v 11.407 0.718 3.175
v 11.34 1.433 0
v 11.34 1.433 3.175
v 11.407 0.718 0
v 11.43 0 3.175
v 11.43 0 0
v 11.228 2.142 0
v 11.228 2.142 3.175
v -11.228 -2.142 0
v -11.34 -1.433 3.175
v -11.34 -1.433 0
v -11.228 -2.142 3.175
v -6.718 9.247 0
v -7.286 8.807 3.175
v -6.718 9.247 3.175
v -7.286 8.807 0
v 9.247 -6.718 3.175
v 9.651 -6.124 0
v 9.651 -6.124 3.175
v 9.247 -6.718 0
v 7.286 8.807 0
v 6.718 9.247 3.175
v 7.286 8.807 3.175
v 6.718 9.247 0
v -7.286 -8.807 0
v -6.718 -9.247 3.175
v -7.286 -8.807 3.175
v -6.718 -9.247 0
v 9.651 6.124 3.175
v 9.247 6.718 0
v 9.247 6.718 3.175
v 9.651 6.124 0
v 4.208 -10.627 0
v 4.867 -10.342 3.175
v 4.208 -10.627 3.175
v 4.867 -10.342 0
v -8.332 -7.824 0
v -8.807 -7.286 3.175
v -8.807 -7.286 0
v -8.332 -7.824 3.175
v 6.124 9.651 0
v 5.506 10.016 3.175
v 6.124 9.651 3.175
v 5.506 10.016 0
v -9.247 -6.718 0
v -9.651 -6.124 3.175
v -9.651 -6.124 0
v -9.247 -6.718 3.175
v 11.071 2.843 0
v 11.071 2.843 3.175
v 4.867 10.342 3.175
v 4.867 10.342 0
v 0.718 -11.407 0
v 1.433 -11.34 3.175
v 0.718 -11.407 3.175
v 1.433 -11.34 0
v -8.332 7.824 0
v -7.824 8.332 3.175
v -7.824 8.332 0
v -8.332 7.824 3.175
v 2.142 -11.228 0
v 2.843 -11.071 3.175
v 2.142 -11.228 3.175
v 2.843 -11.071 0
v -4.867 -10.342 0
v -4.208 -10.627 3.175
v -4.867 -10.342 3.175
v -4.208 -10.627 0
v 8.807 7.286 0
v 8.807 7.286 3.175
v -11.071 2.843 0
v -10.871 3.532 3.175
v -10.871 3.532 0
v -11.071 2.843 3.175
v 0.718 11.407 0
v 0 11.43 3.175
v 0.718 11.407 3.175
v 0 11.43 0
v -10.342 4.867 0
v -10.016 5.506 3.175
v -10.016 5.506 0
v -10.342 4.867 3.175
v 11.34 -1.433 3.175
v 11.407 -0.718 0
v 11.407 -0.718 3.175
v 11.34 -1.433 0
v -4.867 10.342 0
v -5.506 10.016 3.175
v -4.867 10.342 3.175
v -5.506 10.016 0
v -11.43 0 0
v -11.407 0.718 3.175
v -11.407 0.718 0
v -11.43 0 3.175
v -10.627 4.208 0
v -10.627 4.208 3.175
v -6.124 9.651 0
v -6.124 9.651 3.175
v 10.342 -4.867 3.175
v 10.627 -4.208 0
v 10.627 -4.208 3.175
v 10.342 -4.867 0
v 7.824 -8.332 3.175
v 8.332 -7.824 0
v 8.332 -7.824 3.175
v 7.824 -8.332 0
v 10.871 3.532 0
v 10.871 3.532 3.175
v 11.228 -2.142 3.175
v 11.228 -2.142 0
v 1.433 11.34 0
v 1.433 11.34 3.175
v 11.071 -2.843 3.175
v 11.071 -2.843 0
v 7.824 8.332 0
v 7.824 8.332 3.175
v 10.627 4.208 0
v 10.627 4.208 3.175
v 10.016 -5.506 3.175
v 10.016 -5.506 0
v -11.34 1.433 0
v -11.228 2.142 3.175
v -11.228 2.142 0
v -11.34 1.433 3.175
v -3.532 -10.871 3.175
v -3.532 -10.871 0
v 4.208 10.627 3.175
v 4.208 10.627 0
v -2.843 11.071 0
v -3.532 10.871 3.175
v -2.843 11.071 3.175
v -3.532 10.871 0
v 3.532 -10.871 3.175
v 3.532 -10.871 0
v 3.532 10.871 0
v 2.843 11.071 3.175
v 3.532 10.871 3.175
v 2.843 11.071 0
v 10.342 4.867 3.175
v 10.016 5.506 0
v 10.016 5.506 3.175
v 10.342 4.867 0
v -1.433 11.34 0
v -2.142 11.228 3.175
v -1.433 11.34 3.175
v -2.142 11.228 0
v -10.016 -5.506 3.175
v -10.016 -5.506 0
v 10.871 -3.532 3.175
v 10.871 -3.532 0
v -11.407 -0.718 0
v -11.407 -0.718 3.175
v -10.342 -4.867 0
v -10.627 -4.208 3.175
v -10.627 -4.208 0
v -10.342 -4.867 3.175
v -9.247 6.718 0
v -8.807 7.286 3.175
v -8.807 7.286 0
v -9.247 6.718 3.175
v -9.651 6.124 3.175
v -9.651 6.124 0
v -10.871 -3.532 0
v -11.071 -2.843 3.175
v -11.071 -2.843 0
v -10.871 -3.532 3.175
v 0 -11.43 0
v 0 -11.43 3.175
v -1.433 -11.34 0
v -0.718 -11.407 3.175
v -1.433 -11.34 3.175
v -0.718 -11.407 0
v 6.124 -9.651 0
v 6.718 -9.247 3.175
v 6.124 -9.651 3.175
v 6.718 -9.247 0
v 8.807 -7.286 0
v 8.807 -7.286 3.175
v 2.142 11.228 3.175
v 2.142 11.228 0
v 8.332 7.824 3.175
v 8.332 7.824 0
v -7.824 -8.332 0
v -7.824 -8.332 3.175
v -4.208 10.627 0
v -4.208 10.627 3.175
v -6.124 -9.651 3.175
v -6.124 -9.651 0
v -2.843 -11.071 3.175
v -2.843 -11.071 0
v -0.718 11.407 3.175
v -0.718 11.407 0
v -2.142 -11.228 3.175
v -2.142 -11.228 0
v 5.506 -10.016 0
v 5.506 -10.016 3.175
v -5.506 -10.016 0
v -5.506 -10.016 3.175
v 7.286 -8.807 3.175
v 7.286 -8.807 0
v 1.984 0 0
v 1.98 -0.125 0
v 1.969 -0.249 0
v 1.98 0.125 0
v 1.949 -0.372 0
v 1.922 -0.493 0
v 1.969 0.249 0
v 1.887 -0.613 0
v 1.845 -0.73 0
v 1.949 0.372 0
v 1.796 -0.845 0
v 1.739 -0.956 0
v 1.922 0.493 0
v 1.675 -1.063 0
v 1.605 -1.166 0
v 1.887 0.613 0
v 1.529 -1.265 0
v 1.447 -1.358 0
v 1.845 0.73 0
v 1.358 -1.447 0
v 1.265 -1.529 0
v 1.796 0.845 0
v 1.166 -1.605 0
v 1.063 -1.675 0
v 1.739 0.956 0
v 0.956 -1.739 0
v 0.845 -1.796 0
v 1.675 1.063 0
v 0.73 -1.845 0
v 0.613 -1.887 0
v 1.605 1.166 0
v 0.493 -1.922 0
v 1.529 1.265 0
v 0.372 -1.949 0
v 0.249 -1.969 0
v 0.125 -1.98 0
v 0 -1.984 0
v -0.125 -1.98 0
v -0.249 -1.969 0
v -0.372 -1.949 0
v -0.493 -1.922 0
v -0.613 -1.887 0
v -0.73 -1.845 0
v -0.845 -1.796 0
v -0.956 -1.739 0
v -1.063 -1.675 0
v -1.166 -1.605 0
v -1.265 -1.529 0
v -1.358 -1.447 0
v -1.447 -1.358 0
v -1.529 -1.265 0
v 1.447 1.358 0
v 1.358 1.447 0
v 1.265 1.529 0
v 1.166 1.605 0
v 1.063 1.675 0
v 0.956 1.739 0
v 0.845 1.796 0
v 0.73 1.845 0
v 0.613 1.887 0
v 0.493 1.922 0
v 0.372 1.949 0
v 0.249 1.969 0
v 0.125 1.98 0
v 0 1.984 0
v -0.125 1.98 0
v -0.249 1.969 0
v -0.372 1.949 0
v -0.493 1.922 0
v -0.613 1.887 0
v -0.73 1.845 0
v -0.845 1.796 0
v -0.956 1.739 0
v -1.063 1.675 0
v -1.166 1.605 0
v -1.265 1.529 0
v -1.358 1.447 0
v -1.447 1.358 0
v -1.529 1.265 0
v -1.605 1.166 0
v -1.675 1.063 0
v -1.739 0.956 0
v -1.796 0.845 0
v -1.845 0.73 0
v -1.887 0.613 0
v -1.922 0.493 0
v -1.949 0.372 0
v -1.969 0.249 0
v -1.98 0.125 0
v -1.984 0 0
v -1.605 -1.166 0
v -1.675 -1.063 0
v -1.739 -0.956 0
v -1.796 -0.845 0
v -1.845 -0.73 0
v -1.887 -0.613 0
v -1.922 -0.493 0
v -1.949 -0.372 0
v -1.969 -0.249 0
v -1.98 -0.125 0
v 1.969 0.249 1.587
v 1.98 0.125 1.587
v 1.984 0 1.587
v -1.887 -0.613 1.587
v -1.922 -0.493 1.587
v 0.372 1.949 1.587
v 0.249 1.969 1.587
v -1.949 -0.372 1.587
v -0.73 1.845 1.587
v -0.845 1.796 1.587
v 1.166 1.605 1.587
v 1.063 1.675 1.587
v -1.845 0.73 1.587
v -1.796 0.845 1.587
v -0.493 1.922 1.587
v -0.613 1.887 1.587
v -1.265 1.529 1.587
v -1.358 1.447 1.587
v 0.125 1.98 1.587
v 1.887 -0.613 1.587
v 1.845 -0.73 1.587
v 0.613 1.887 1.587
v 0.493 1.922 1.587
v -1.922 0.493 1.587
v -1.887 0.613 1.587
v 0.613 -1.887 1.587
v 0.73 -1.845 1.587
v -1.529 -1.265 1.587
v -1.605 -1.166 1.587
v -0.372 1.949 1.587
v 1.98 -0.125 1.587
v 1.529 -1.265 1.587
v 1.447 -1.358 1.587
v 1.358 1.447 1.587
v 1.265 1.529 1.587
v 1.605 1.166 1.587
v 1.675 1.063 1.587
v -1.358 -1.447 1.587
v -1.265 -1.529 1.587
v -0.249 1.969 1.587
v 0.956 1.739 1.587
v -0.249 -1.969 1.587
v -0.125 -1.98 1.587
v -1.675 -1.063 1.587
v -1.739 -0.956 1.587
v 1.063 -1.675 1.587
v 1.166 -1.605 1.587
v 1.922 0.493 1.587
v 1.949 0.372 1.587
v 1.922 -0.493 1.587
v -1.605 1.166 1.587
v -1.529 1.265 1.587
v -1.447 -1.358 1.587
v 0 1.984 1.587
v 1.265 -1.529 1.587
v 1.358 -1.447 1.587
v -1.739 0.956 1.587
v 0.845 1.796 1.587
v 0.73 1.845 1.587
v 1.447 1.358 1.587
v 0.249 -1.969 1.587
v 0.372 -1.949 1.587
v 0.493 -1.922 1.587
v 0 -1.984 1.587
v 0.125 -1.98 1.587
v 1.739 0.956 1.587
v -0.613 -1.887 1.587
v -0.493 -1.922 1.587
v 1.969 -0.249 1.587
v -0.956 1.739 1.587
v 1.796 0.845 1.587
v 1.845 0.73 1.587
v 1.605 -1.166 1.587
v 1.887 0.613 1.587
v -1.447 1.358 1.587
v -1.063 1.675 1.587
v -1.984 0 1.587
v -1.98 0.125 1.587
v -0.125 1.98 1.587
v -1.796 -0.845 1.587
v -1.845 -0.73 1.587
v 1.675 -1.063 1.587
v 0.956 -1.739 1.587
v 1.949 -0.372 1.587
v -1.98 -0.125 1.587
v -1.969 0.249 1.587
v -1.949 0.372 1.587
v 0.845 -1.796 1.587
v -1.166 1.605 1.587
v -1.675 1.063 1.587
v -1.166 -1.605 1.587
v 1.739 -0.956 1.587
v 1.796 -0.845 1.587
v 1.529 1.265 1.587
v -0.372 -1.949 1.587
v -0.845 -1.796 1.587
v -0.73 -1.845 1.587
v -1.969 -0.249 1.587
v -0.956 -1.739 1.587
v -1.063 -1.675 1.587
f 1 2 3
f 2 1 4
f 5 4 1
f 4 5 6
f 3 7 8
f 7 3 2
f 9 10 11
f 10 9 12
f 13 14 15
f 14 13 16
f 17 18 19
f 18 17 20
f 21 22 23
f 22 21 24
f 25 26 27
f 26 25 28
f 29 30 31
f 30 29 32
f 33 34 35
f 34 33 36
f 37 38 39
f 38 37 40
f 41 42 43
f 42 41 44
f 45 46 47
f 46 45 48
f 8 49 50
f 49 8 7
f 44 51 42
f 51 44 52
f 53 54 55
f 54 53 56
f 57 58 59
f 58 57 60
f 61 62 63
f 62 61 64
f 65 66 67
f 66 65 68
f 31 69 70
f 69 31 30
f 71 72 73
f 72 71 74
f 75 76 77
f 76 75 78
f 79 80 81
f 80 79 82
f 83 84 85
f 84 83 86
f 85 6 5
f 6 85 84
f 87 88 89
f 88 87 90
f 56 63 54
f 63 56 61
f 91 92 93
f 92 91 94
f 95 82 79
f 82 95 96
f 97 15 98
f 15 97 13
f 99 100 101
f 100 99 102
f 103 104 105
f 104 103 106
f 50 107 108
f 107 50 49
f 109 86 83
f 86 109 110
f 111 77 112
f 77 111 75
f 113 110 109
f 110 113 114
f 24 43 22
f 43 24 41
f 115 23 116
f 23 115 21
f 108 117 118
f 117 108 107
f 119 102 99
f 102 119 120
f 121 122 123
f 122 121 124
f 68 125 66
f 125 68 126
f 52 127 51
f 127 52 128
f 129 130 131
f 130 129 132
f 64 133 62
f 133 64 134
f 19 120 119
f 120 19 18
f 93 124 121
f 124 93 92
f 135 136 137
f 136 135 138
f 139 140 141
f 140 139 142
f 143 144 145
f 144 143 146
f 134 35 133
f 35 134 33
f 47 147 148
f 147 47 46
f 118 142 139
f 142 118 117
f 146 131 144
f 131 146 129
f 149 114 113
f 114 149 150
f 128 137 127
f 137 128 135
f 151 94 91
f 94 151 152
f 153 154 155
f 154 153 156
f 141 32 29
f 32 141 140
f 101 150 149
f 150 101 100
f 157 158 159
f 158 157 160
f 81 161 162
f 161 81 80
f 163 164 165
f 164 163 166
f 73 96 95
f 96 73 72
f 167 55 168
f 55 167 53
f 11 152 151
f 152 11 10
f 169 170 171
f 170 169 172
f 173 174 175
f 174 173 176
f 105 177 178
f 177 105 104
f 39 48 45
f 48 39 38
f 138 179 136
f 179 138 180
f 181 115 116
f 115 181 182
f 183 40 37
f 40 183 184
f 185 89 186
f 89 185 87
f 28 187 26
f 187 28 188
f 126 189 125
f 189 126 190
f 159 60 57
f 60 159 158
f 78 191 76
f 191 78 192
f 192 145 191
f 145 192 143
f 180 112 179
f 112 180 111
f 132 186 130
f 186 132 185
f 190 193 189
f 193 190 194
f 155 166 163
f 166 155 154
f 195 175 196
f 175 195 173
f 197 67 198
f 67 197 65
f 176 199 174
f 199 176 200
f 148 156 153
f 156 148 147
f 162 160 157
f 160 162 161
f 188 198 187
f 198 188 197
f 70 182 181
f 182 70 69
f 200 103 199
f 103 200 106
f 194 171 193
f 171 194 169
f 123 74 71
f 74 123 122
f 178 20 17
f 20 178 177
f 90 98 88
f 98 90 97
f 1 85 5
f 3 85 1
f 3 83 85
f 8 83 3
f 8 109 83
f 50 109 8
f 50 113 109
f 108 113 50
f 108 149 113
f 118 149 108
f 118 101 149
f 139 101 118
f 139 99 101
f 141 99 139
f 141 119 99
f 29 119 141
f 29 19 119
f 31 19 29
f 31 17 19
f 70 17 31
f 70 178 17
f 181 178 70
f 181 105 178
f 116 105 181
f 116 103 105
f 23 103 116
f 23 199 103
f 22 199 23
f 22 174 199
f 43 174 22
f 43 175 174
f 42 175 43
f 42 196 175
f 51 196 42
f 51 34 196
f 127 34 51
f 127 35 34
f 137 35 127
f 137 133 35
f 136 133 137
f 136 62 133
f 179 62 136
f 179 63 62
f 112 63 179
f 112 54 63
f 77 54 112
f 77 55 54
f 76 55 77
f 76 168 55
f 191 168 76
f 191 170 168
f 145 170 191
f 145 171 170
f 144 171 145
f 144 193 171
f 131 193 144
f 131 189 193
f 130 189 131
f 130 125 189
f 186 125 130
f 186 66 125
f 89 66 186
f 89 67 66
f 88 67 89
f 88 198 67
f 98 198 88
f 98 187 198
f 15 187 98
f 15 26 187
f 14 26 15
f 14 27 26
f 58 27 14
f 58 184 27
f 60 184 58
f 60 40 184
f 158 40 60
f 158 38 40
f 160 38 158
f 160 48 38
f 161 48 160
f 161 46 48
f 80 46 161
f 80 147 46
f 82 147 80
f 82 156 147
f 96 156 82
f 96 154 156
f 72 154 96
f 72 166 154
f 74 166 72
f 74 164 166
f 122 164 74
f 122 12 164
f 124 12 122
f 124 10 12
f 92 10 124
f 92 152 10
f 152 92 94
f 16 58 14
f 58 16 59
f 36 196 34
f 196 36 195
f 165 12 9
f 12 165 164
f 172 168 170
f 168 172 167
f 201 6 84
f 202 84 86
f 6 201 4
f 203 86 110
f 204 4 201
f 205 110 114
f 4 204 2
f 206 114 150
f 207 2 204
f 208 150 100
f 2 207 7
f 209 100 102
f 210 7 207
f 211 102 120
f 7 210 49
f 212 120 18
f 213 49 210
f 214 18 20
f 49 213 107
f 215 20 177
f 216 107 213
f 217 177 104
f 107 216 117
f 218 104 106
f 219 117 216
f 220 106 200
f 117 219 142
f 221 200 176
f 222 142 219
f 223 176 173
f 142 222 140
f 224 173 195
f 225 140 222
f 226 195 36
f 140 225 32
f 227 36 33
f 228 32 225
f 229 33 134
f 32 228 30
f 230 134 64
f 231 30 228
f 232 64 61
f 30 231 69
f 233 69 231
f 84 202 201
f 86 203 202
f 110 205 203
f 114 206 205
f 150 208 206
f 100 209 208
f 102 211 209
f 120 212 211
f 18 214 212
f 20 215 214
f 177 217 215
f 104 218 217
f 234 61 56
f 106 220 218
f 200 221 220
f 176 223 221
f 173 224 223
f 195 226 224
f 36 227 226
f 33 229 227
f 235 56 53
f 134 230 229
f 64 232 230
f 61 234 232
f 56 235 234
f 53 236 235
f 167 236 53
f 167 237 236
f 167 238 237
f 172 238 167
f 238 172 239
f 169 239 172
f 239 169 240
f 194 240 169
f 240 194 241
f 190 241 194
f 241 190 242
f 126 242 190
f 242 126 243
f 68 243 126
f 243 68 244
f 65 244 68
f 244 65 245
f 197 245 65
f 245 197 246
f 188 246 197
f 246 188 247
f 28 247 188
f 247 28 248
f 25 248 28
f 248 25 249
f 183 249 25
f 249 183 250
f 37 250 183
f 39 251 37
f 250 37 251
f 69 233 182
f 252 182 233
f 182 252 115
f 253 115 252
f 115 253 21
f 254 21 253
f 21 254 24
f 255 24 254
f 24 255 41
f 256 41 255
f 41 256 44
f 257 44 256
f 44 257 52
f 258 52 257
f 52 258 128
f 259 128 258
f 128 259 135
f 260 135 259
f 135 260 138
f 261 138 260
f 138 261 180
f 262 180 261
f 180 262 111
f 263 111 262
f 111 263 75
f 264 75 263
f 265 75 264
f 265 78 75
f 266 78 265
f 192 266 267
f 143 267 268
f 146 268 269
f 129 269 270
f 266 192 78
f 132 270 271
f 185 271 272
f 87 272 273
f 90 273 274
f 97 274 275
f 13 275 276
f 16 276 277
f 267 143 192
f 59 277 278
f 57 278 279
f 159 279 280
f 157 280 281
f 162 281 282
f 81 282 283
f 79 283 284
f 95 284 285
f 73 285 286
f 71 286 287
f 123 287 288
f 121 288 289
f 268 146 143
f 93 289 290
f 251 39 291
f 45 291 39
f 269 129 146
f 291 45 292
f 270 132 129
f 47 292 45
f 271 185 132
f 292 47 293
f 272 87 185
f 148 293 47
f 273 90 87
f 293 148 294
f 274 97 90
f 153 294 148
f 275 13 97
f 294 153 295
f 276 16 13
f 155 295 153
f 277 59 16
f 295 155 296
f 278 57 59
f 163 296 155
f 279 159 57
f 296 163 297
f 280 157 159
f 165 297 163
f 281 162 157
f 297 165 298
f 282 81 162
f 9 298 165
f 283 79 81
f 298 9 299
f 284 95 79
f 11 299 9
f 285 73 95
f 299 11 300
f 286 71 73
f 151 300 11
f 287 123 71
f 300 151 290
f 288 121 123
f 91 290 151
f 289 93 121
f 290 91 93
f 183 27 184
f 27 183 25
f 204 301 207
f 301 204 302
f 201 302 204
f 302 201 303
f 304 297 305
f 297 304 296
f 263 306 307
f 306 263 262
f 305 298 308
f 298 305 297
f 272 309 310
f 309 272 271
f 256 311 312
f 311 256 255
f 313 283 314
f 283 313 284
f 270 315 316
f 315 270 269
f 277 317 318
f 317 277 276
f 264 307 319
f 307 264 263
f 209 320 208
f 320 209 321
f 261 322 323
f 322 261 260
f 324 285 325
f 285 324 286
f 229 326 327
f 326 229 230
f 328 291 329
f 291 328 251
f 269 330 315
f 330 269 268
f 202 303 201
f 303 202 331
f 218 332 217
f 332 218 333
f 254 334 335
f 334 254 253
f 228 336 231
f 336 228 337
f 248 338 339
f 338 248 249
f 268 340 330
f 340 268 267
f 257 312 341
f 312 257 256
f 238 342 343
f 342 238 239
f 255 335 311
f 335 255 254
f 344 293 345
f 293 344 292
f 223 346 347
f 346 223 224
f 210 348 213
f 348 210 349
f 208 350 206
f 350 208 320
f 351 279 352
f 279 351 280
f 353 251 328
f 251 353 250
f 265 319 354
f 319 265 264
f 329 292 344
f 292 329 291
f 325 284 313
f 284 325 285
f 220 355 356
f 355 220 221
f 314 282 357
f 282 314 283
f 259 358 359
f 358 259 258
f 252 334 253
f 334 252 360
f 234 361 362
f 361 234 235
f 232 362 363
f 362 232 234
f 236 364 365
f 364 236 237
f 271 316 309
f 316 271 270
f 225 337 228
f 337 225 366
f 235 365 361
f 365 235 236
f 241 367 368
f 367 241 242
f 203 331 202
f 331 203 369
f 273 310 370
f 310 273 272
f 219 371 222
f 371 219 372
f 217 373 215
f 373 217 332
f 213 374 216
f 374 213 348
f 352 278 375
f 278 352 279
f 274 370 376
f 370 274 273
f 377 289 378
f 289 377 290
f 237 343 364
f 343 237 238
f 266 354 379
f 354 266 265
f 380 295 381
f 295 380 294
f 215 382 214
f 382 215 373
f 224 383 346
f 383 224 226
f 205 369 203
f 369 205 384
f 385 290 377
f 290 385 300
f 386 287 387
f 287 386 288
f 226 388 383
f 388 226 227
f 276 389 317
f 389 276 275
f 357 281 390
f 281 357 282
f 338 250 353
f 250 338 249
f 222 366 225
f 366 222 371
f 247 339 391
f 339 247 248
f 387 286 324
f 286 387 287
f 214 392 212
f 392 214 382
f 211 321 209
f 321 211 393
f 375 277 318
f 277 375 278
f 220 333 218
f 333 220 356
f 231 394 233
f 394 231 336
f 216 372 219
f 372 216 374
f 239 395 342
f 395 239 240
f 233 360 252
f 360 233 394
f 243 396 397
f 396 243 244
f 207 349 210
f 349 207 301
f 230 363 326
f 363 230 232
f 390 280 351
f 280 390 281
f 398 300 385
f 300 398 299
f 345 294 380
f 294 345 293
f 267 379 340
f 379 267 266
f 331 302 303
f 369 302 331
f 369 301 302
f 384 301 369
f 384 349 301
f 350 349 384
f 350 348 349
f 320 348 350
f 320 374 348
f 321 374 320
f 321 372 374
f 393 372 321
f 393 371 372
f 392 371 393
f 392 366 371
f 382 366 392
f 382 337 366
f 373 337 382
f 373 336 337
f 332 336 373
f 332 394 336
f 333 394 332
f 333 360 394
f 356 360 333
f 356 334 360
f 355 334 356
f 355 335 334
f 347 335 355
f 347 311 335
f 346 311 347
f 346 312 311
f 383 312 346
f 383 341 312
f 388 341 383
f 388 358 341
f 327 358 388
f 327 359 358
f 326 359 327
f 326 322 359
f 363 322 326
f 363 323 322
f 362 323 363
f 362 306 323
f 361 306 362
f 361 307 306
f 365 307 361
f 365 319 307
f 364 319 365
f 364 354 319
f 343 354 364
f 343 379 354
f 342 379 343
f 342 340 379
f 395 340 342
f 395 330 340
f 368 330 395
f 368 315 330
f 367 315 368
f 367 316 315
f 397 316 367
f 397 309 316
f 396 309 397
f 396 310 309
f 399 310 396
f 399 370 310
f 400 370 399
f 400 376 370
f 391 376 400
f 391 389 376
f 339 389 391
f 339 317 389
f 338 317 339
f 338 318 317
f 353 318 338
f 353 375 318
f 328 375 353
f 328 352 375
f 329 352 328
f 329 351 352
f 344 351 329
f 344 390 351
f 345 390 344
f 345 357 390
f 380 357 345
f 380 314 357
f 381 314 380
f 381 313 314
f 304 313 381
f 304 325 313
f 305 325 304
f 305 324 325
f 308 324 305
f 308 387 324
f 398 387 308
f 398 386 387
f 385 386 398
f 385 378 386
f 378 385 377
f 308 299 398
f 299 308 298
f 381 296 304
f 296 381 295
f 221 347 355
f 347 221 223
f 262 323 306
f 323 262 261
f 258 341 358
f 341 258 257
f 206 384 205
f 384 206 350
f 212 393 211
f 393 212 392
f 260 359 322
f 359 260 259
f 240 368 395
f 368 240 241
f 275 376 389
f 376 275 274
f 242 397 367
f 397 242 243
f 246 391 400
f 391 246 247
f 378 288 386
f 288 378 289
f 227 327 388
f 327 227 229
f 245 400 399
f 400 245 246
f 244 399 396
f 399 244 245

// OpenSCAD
inch = 25.4;
$fn = 100;

difference() {
    cylinder(h = inch * 1/8, r = .9 * inch * 1/2);
    cylinder(h = inch * 1/16, r = 1.25 * inch * 1/16);
}
